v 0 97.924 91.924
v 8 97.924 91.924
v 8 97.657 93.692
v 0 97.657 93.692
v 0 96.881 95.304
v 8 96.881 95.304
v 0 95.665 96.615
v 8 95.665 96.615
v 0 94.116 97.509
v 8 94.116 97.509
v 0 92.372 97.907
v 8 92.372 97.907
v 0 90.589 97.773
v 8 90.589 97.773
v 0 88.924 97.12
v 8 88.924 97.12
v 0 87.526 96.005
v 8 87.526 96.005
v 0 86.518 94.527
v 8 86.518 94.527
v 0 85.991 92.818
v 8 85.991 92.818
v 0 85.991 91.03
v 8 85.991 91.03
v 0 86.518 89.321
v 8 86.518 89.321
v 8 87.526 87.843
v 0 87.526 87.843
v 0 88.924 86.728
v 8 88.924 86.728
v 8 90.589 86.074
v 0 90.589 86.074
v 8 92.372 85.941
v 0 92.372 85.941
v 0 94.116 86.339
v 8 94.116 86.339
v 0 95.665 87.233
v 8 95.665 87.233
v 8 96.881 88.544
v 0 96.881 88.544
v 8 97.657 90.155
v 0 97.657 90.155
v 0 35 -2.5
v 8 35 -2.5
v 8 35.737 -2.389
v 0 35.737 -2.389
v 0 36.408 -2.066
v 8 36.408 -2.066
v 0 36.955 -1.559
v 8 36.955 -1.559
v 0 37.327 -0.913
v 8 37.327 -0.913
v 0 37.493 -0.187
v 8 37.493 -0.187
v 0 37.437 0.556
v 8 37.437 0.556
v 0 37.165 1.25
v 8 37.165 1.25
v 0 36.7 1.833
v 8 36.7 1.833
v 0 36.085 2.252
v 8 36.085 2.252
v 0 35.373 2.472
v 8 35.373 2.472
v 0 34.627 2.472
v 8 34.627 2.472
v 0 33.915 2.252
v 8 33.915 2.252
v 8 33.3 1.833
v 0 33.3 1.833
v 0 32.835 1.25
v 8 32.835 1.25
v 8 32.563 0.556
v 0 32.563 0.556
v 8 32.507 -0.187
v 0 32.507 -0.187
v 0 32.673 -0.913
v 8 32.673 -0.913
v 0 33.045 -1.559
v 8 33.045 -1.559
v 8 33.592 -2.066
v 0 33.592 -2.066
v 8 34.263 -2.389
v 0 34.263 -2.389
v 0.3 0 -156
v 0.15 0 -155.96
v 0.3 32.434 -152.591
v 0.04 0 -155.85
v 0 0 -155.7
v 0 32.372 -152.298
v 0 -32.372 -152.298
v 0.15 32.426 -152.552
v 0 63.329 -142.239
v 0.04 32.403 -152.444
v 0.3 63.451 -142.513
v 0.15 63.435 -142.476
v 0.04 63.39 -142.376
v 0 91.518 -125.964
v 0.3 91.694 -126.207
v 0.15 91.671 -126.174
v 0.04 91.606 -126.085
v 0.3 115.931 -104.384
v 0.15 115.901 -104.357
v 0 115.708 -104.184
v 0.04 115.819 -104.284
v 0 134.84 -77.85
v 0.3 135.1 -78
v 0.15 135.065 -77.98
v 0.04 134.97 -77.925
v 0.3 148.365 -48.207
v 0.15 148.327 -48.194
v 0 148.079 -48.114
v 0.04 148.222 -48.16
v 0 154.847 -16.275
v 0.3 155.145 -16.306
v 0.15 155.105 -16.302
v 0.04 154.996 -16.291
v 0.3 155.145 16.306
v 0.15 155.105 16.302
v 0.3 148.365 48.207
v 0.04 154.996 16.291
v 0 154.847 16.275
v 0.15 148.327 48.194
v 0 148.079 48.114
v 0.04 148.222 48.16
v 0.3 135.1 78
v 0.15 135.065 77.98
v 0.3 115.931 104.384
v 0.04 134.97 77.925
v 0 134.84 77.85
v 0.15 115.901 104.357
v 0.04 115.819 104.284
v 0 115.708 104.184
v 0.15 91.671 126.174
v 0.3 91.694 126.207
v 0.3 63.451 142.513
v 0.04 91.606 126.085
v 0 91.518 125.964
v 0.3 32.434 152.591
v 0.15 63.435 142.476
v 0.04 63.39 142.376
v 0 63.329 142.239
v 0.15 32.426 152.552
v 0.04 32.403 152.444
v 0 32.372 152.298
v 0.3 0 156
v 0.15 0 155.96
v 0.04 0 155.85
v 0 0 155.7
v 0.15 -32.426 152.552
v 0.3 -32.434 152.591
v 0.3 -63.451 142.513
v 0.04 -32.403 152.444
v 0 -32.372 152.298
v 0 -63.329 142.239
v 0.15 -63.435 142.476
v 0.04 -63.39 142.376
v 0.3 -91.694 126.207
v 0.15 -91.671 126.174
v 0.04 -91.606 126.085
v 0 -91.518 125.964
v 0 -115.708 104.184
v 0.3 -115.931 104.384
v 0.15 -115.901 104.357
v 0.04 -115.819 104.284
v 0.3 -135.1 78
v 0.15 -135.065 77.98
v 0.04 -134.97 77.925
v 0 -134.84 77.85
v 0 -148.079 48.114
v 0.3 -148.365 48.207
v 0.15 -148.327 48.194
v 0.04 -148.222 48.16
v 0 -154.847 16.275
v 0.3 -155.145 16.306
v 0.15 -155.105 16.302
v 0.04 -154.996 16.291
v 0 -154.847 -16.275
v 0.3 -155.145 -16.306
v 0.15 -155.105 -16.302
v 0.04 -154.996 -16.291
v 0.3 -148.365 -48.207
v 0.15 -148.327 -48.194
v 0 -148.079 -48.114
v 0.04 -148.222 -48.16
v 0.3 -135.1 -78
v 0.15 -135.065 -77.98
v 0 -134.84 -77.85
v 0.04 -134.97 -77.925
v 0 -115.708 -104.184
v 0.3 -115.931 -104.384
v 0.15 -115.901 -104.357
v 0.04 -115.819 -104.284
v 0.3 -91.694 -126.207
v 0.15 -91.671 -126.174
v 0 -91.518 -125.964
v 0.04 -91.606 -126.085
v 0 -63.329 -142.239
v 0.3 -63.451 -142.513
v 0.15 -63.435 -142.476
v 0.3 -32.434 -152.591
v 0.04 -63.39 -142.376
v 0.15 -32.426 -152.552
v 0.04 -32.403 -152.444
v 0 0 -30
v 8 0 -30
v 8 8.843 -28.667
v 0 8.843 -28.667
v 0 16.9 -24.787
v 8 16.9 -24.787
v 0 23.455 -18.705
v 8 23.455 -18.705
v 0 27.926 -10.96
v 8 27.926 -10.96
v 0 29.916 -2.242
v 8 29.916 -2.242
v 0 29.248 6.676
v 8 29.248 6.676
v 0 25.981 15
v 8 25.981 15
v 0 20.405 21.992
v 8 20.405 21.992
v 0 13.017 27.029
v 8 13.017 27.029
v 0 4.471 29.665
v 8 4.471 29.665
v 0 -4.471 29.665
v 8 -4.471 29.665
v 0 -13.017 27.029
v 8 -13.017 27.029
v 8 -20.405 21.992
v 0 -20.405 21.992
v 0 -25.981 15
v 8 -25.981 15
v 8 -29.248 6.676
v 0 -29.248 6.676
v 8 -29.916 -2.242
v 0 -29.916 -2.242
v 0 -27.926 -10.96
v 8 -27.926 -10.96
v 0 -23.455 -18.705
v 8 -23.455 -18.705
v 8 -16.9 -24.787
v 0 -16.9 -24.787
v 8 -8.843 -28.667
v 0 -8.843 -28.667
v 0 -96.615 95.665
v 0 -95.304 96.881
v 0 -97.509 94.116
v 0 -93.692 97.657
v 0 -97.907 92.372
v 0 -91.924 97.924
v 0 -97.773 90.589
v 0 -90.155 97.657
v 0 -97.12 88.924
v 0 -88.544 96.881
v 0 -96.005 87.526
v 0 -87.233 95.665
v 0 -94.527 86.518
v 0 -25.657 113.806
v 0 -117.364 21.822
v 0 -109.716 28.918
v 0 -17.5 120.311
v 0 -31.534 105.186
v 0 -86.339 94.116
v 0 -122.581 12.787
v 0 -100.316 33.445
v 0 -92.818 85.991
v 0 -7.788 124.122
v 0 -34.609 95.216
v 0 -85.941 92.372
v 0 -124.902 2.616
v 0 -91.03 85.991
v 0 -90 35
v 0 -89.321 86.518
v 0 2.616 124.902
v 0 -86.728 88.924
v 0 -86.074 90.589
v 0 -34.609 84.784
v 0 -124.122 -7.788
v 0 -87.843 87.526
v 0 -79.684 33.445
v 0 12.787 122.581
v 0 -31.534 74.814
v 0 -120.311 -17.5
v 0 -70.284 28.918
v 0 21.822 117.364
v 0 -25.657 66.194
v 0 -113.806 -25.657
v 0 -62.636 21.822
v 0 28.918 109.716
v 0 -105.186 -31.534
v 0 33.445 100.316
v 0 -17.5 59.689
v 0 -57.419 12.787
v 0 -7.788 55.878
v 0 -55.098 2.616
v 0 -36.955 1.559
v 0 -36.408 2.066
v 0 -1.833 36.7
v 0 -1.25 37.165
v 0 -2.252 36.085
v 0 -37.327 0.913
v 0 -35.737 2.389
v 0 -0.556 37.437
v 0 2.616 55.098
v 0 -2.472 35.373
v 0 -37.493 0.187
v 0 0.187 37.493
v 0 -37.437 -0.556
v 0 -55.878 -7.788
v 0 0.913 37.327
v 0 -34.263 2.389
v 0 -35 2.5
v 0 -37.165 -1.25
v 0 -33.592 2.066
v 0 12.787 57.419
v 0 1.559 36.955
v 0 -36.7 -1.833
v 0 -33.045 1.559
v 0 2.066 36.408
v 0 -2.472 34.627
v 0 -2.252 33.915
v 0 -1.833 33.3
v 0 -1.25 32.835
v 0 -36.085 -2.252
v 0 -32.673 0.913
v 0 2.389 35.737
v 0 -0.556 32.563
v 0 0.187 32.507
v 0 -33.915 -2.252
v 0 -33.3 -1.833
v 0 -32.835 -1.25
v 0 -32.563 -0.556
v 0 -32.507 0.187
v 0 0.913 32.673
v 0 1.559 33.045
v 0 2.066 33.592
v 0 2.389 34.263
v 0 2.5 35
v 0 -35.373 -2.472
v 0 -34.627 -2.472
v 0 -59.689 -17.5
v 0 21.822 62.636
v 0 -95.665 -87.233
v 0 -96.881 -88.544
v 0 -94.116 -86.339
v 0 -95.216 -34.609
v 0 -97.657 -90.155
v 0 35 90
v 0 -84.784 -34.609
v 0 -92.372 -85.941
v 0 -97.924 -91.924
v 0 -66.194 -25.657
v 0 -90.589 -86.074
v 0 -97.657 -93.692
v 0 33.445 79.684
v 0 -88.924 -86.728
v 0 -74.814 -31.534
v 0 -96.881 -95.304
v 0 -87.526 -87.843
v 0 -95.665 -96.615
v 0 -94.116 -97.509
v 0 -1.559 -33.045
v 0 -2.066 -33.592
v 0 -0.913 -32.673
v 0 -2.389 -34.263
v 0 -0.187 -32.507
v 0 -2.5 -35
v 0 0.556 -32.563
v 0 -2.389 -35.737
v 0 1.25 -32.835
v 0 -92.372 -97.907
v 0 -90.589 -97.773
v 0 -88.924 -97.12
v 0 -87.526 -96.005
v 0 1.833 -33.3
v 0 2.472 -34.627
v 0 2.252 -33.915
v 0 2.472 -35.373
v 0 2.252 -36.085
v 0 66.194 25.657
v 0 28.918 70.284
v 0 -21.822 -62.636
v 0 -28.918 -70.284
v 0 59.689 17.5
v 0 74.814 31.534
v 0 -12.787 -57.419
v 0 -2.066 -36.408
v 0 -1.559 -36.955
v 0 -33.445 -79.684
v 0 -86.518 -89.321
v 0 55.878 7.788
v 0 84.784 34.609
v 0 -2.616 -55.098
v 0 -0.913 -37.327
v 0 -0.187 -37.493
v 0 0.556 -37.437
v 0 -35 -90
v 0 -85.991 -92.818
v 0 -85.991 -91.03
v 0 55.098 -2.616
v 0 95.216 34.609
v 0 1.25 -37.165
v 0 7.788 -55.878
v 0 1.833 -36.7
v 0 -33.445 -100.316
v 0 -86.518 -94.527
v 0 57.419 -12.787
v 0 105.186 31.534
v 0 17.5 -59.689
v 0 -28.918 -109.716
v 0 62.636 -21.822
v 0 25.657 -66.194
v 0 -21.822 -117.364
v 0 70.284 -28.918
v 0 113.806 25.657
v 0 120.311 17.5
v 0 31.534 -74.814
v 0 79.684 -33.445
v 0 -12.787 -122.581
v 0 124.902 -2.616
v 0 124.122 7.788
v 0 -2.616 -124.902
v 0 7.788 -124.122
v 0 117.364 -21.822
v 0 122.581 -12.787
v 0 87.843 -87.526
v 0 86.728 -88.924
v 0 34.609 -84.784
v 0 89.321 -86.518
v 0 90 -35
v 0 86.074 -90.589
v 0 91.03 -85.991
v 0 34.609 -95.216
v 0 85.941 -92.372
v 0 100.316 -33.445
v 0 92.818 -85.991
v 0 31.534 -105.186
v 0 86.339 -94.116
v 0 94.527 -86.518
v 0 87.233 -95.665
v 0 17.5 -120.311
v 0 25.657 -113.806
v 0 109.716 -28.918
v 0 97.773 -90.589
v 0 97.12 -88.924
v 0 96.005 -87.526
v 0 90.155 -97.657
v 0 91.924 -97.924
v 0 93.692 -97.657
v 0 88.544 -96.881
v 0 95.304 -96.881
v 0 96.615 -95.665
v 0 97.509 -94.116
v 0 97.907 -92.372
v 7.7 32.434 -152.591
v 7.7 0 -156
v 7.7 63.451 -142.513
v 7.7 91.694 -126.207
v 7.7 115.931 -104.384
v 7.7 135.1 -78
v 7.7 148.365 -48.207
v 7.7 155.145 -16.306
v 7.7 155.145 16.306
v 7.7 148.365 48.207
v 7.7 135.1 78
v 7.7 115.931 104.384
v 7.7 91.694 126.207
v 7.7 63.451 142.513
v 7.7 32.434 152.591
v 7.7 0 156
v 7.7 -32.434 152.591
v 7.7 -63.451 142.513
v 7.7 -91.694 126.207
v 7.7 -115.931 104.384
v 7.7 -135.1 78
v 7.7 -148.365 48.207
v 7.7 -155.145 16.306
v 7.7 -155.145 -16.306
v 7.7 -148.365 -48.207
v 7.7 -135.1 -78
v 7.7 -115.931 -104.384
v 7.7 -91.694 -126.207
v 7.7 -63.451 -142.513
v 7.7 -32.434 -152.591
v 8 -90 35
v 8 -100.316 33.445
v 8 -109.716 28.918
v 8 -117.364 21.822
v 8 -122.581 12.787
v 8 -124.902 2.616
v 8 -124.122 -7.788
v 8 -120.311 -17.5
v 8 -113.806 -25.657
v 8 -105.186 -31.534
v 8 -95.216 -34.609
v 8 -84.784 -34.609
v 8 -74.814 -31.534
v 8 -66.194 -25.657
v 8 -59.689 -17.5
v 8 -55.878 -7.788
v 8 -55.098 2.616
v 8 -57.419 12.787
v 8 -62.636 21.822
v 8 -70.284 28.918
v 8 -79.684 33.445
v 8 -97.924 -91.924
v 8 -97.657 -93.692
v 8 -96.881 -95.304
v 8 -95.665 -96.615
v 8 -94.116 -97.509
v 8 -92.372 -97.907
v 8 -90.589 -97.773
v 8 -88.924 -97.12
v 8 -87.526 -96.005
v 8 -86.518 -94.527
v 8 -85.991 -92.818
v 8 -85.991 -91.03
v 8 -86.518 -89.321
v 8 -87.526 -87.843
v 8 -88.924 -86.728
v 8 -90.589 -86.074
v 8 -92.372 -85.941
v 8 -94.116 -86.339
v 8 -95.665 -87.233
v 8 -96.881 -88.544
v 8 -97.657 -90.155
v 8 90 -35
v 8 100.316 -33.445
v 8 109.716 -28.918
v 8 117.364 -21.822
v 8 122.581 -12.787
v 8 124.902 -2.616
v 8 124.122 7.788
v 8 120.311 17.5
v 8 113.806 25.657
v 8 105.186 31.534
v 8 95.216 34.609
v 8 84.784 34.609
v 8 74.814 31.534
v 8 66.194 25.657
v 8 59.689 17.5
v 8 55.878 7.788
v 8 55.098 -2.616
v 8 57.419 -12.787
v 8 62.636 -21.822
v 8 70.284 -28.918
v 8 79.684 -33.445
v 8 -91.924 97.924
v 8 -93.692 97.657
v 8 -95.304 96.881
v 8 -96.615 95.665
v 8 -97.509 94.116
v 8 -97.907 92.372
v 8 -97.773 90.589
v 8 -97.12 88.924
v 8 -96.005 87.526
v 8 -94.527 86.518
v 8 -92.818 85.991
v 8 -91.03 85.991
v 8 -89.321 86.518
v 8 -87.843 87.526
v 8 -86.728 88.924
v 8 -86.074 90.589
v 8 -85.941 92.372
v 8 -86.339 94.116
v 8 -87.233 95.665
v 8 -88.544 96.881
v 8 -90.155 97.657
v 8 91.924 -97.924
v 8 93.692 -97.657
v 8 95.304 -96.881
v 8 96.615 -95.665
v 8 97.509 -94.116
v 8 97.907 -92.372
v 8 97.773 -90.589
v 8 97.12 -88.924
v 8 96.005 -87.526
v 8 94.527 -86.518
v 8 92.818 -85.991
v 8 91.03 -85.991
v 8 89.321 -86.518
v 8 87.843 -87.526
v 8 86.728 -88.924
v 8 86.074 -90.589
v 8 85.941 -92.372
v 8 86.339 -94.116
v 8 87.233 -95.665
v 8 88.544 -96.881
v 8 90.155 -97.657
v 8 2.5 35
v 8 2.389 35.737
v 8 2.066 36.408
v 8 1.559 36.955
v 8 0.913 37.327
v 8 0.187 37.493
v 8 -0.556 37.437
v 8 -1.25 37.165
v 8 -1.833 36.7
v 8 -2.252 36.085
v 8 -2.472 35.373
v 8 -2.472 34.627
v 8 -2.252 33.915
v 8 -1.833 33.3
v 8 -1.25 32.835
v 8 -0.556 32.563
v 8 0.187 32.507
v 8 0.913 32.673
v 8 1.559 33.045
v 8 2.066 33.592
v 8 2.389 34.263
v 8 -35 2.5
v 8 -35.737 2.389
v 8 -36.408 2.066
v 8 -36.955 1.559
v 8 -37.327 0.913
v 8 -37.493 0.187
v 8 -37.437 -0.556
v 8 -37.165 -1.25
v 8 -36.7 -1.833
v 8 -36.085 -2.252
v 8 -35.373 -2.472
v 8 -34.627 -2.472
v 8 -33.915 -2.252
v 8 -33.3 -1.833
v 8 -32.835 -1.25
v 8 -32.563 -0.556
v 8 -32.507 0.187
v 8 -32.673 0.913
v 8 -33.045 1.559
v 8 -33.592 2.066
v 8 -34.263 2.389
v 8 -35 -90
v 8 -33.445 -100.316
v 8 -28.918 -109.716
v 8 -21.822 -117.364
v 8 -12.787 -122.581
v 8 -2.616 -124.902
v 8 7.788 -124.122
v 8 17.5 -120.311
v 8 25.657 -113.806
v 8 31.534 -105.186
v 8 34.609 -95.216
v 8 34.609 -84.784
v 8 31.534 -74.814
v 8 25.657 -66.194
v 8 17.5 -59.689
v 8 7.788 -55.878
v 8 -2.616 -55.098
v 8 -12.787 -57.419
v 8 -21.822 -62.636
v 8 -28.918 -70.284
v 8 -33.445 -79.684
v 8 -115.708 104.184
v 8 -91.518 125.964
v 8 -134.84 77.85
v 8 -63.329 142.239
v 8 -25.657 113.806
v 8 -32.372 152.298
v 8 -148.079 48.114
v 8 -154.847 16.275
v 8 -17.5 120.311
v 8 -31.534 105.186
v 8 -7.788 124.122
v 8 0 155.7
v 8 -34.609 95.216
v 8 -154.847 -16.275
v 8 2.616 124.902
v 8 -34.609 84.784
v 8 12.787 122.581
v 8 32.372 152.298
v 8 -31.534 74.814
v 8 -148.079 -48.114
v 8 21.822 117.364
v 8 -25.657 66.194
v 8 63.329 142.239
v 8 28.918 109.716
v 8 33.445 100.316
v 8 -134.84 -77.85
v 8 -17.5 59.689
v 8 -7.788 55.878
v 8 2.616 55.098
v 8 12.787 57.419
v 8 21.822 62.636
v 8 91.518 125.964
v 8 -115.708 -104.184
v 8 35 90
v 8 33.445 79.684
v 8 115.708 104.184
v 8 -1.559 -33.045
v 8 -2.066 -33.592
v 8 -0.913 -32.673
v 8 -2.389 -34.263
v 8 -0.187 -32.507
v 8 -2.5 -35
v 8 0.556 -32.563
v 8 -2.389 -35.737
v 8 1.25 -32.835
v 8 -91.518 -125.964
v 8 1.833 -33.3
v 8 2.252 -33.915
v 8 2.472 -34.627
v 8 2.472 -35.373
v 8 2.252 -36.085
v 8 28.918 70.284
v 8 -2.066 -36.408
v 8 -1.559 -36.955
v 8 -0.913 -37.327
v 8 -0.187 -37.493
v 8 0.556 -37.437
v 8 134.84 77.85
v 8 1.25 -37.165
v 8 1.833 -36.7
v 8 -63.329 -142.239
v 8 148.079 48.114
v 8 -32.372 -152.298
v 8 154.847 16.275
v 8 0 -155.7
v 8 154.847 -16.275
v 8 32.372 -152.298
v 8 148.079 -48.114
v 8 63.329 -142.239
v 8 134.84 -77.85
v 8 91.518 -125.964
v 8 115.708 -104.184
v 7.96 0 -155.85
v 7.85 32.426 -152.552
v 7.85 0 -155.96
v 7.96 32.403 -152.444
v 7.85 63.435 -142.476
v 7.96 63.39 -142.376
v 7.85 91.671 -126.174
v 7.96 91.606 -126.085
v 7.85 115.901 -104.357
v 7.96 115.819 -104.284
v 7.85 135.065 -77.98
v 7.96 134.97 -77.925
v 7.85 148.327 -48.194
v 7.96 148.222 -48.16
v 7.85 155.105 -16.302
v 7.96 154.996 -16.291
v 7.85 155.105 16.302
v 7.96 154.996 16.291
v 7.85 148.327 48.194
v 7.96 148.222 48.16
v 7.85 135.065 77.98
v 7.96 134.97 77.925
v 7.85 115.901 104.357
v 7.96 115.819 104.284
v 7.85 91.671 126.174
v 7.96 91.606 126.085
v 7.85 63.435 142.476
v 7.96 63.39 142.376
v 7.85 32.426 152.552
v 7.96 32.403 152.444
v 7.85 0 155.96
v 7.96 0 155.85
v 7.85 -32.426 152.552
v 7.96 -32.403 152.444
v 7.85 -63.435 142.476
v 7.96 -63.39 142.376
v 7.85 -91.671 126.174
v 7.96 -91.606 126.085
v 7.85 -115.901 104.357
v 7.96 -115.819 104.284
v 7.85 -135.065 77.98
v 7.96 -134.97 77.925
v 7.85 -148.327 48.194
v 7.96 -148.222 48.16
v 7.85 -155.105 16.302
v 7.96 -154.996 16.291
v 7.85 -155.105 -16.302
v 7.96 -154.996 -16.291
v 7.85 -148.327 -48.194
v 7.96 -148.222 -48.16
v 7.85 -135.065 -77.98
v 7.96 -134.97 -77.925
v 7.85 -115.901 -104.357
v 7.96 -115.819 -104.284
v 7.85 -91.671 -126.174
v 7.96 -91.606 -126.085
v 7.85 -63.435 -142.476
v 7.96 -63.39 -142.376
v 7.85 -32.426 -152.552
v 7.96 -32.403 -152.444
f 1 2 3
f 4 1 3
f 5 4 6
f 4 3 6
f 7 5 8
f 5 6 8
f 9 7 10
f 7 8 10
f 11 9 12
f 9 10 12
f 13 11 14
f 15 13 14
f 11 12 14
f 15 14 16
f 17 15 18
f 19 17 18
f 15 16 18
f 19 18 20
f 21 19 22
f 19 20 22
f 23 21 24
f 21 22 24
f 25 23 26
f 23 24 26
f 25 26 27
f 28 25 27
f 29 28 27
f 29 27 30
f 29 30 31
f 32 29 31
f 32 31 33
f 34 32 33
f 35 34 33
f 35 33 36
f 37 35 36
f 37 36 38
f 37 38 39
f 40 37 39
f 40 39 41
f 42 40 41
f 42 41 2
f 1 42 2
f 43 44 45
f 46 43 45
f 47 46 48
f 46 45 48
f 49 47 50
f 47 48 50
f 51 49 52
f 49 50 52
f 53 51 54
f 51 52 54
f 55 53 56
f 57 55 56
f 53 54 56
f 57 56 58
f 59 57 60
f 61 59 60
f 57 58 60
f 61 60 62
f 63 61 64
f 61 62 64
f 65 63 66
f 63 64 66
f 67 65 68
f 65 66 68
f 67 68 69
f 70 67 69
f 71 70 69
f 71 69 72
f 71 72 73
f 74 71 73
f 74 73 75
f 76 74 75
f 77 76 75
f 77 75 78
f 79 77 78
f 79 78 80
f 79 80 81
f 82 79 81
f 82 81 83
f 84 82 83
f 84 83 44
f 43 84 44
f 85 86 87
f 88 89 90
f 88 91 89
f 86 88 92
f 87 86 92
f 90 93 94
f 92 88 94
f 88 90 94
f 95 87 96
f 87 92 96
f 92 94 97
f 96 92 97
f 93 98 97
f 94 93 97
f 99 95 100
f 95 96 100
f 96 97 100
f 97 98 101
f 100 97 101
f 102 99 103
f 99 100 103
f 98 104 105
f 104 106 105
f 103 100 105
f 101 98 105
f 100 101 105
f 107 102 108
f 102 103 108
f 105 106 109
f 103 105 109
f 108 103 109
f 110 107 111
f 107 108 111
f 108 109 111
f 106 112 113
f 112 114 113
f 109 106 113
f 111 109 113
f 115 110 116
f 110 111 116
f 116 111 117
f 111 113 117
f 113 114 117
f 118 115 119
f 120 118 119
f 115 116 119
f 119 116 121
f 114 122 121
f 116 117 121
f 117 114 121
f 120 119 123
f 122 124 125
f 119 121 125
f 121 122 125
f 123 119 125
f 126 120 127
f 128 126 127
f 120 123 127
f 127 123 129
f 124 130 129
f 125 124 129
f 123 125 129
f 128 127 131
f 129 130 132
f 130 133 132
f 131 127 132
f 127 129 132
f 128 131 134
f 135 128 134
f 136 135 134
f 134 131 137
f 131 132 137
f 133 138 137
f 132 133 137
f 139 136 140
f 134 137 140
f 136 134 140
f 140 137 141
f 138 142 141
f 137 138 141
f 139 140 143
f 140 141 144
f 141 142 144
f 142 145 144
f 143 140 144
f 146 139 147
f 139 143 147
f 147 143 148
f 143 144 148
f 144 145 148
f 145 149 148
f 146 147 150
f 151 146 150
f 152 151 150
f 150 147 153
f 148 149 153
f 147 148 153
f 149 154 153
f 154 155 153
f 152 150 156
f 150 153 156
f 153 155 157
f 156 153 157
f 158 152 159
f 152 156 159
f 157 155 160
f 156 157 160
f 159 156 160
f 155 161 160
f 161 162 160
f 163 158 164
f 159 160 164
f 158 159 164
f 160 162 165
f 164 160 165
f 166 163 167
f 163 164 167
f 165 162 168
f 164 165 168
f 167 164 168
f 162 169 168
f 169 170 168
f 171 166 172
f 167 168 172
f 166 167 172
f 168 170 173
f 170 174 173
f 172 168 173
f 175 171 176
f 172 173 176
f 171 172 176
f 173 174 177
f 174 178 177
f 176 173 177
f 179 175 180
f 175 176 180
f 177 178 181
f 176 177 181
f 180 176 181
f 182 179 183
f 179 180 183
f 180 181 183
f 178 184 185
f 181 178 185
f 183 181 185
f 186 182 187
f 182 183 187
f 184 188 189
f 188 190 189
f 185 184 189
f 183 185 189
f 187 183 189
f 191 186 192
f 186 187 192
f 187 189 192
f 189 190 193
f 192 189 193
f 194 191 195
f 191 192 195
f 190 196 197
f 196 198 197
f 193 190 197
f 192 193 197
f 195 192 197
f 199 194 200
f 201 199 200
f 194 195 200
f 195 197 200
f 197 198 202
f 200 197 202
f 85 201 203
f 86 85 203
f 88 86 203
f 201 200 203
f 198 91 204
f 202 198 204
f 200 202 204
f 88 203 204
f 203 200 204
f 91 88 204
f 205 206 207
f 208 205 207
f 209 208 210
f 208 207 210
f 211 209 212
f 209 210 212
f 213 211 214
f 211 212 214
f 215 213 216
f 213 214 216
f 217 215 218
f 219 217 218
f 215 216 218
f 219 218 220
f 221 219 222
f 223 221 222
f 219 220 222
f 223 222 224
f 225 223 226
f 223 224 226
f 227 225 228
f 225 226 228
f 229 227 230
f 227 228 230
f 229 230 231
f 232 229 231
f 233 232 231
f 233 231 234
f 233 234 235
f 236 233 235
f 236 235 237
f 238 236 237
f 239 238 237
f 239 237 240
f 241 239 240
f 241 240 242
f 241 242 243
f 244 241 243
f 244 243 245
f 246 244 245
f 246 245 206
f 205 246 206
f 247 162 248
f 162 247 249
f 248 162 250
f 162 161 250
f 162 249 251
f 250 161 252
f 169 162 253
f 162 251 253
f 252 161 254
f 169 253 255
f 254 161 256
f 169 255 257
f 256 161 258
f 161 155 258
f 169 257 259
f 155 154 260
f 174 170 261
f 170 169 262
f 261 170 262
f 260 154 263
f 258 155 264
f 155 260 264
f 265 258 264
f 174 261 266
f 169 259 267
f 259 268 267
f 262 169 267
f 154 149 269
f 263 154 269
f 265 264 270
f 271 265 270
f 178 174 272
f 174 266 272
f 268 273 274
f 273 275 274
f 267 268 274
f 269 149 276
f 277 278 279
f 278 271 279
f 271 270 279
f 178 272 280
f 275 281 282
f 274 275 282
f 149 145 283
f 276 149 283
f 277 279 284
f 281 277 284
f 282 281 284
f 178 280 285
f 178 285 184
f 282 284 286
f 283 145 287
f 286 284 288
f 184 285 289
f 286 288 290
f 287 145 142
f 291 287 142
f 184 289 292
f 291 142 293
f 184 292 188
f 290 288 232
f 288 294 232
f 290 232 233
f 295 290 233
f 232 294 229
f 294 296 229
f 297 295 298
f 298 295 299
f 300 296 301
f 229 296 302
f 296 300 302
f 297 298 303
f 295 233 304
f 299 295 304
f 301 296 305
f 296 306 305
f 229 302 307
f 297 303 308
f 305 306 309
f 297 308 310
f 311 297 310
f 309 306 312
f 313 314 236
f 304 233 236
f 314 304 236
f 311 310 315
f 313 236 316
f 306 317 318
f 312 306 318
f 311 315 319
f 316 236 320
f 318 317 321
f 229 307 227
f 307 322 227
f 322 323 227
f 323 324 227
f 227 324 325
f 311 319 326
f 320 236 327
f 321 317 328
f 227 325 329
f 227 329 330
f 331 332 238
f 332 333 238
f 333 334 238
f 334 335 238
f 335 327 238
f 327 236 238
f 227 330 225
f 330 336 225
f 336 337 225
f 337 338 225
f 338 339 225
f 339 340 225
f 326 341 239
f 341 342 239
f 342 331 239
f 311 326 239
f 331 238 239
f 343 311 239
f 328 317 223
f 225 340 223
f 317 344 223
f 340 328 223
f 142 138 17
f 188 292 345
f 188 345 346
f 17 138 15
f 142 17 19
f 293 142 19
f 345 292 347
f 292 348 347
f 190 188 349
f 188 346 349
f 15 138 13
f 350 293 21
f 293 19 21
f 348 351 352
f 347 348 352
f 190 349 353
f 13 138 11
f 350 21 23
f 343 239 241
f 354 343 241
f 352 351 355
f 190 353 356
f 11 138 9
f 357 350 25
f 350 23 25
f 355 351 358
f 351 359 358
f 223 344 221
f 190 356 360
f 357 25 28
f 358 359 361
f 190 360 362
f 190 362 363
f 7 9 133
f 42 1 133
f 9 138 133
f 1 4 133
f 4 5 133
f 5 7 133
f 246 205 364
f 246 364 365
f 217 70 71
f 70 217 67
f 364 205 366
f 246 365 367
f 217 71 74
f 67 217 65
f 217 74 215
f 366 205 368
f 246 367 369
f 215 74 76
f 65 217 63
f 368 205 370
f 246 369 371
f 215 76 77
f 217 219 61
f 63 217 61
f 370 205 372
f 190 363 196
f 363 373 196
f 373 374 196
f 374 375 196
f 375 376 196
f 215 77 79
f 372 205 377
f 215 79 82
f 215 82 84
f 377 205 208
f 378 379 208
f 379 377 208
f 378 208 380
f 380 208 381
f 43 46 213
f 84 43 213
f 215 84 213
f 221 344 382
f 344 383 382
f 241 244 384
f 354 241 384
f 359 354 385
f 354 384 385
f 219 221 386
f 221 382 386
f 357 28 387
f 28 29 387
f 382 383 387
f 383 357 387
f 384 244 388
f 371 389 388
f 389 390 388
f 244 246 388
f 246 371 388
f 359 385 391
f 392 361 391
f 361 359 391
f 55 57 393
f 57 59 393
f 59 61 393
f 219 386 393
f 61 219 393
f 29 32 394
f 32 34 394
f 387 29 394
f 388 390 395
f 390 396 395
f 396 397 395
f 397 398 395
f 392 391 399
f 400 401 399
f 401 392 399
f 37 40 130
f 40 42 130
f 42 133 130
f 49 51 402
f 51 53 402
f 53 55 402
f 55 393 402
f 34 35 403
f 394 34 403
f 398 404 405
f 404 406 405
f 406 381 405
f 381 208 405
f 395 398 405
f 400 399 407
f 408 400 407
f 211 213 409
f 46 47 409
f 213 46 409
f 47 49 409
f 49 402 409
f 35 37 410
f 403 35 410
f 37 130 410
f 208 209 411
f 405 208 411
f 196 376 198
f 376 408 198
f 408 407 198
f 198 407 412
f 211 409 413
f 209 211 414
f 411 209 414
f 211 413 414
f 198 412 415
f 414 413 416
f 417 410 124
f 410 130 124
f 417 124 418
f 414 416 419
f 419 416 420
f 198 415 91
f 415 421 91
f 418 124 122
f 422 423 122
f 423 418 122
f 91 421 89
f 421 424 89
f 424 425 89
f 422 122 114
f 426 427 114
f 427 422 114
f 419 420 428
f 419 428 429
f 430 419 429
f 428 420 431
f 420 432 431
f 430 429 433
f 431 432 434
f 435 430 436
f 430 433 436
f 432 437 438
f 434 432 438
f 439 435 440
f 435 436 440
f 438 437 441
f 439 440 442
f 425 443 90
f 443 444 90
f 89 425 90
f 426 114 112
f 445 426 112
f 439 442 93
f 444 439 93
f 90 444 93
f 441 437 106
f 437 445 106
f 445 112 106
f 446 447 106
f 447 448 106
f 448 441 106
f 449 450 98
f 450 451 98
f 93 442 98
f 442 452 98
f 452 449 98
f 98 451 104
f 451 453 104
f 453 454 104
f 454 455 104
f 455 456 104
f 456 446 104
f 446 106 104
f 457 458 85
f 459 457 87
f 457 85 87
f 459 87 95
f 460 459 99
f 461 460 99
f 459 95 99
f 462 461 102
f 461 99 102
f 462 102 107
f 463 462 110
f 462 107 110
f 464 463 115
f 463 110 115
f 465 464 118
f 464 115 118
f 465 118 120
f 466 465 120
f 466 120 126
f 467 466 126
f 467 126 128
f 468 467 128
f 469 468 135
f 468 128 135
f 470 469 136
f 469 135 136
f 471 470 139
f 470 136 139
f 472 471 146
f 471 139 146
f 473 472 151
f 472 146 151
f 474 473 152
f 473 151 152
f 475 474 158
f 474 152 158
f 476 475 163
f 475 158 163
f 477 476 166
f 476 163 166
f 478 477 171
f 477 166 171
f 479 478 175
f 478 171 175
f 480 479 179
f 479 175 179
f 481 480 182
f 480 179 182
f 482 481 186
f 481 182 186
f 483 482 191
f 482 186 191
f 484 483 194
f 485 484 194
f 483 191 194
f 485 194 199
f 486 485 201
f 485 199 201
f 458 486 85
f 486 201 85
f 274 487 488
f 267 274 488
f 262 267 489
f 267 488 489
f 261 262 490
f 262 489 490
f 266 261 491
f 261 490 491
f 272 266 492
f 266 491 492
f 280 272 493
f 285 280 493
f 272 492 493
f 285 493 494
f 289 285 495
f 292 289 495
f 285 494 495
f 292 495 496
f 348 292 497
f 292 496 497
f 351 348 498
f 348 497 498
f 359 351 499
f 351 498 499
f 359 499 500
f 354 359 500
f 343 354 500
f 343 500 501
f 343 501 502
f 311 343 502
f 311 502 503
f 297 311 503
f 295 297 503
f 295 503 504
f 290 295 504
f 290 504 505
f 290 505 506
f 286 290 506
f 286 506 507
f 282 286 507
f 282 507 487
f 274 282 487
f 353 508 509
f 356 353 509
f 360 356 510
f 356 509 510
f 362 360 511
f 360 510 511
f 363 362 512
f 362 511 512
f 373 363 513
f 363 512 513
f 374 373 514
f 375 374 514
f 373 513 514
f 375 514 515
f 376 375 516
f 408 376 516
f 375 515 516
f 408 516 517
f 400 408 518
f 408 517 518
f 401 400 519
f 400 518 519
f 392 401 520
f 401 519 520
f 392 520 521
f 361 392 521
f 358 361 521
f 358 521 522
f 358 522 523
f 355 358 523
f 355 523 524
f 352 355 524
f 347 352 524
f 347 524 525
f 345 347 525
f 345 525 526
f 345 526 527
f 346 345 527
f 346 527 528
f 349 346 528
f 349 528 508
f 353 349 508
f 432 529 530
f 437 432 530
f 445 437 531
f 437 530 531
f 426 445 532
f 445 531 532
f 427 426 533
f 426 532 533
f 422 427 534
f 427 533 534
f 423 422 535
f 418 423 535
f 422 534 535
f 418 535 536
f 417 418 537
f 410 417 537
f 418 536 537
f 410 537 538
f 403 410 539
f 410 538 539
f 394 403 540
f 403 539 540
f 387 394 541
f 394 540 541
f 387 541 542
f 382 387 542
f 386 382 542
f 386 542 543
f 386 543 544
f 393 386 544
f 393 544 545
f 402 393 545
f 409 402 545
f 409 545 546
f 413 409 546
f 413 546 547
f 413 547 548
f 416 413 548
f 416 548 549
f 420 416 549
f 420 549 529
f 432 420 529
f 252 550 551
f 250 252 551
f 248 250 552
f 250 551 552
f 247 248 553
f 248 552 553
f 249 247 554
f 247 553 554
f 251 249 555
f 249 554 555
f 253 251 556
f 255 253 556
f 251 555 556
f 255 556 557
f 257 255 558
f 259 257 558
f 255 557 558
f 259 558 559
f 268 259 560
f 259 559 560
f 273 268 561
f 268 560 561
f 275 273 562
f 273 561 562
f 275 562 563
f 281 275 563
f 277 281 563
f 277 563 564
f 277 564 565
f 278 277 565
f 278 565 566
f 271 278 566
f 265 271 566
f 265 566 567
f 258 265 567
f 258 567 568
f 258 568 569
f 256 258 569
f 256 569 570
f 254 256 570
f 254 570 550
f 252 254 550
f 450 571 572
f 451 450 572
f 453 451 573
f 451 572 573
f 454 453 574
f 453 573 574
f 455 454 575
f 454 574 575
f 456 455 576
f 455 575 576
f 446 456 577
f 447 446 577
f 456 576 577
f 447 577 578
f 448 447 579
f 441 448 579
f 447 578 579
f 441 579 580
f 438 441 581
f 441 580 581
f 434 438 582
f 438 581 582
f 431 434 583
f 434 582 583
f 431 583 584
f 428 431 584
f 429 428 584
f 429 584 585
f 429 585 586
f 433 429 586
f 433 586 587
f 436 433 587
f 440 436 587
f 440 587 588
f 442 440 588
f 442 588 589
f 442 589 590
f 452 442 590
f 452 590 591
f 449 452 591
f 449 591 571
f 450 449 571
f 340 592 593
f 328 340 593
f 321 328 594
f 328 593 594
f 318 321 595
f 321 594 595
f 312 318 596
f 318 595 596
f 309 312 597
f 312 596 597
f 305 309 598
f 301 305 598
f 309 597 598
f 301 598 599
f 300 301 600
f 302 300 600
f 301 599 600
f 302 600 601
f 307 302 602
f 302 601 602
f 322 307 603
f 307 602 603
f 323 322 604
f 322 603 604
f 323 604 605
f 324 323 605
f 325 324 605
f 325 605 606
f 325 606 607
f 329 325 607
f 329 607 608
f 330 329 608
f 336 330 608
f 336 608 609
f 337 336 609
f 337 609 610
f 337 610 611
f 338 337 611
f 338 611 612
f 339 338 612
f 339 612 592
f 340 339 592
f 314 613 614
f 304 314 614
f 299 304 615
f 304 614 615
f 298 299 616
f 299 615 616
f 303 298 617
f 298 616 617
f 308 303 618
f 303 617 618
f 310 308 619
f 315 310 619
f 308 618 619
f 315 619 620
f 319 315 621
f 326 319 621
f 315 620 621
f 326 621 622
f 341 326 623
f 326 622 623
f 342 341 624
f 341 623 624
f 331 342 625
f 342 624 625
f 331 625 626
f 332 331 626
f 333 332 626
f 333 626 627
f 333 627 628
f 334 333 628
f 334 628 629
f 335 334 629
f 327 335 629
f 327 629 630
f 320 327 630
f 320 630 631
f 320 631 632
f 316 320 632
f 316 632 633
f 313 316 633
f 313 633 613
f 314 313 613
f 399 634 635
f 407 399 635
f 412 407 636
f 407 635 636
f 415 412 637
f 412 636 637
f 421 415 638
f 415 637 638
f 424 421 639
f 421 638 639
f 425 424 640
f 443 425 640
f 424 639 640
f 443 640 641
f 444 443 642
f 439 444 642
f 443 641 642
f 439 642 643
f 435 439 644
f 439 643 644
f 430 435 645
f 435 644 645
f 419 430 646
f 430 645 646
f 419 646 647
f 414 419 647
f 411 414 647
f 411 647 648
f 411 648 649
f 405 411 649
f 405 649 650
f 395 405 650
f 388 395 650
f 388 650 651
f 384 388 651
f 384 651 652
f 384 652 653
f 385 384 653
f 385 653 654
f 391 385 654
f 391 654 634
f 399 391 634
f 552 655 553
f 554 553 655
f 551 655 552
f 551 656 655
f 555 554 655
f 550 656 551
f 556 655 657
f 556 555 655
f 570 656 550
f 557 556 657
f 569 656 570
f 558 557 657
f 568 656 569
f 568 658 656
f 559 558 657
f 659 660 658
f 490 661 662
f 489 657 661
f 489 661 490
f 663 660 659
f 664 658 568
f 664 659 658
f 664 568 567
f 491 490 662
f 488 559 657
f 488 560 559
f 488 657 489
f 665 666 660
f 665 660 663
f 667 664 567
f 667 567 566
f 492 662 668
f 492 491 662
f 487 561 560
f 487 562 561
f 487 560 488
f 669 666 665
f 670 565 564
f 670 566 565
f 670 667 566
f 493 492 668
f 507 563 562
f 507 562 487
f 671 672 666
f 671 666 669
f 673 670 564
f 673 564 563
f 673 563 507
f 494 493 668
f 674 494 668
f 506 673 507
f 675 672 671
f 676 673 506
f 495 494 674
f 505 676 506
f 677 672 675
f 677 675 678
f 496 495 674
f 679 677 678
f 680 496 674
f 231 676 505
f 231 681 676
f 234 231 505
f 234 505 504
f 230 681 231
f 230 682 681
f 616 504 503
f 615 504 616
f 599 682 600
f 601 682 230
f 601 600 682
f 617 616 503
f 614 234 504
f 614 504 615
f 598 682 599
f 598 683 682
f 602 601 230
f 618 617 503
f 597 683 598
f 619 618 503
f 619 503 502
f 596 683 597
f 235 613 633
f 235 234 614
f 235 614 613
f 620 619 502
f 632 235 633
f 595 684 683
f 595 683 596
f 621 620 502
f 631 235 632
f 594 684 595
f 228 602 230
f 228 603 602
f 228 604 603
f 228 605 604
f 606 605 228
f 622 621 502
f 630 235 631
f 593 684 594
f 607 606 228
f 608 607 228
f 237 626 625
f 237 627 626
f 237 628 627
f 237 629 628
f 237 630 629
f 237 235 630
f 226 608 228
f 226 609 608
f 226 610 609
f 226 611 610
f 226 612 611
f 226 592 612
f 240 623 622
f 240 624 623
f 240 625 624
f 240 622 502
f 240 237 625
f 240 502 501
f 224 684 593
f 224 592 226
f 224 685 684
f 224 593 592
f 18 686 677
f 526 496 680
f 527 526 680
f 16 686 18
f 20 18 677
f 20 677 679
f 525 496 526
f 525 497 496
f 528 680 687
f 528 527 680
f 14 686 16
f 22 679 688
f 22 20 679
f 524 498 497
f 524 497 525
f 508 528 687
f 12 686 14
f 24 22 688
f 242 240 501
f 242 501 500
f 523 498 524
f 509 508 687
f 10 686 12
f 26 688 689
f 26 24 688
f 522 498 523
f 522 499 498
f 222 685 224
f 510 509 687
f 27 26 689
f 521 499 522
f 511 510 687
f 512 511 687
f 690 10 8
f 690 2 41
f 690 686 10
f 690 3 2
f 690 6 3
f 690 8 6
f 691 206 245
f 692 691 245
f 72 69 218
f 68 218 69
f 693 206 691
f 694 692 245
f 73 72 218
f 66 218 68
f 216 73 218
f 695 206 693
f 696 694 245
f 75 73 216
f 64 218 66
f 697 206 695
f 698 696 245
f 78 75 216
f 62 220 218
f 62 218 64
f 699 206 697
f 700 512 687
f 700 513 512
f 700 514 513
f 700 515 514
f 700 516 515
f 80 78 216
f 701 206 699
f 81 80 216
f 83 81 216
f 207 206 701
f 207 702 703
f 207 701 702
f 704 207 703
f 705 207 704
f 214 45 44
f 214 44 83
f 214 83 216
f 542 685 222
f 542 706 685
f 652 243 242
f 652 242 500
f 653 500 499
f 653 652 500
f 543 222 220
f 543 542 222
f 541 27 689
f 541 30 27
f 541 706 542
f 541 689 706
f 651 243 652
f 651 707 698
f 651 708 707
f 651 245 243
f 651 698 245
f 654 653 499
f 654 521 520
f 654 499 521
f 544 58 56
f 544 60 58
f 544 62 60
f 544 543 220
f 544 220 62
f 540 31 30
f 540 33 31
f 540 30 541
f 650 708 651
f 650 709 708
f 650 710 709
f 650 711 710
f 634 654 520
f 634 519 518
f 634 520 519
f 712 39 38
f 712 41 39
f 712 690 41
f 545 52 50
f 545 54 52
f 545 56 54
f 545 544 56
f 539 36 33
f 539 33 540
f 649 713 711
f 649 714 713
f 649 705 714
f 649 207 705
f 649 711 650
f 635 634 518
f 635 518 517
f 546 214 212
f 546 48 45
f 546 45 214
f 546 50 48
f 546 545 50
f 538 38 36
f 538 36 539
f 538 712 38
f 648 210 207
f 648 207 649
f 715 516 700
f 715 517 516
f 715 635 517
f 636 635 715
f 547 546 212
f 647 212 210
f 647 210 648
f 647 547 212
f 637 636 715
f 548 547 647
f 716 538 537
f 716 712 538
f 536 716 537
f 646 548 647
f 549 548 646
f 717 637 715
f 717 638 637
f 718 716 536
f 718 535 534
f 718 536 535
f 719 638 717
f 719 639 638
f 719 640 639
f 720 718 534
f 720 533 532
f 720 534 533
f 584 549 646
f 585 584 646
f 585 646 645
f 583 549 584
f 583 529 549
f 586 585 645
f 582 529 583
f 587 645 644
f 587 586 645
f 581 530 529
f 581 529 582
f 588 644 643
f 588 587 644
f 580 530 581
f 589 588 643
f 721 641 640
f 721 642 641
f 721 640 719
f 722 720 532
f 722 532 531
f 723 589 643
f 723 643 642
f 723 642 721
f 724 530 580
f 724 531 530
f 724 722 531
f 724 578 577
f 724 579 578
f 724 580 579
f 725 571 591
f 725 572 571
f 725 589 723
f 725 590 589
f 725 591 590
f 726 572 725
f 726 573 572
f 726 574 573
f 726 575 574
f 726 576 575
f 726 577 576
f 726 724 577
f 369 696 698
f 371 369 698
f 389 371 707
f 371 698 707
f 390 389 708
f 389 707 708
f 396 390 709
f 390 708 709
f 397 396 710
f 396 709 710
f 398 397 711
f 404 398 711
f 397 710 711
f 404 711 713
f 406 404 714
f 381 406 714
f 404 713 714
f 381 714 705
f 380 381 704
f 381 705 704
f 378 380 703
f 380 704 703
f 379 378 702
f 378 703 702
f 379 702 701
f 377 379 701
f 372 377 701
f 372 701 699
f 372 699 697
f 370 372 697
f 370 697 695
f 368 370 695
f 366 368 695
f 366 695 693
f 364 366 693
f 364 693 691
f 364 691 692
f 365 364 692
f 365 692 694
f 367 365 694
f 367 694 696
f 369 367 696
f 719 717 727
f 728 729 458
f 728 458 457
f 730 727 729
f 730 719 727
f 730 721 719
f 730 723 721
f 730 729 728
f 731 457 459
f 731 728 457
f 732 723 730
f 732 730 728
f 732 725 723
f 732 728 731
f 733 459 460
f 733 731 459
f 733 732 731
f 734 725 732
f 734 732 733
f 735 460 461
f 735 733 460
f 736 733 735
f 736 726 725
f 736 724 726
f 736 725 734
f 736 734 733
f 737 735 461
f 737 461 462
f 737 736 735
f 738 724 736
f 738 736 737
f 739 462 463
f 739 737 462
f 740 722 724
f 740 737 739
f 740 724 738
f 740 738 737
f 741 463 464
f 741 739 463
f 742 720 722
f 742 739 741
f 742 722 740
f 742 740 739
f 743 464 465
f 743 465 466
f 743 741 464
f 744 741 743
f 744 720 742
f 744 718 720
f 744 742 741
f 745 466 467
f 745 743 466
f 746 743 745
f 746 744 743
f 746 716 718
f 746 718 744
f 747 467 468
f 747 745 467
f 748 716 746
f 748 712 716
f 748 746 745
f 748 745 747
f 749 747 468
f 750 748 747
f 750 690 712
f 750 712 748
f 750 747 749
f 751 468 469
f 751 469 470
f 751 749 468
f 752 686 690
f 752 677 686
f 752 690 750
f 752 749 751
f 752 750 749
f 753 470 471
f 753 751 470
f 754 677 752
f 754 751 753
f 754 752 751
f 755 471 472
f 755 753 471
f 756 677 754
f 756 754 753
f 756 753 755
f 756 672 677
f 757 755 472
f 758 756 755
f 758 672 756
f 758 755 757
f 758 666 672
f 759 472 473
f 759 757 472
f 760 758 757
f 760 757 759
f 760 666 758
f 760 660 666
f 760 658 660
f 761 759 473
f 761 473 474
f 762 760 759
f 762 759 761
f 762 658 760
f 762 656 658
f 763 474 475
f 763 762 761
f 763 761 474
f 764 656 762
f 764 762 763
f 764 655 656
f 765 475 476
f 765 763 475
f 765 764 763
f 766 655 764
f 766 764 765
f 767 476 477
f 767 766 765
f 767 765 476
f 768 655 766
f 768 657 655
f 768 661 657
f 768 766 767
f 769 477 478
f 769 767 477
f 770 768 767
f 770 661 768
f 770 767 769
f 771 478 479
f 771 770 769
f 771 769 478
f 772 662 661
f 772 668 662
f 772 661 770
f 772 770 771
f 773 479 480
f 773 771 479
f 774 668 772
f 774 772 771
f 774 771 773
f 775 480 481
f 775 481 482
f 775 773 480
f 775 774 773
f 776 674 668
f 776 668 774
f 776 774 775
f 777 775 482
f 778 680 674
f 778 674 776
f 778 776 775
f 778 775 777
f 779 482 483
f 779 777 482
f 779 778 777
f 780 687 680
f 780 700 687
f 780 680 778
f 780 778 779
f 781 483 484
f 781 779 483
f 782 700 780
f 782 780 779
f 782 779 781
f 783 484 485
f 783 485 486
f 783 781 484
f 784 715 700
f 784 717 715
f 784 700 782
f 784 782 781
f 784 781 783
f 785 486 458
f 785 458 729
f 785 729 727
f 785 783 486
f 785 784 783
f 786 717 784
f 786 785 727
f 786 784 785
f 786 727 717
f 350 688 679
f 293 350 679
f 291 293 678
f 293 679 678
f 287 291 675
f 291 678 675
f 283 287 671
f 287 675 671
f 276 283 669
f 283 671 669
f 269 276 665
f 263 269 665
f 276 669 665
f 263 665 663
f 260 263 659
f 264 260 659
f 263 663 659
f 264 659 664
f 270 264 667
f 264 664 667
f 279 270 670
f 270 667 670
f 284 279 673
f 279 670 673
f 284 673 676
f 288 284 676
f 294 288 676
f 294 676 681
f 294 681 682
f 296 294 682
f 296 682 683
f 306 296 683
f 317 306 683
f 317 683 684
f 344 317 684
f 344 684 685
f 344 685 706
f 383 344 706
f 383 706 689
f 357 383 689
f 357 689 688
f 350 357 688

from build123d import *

# Parameters (mm, degrees)
SKETCH_1_R               = 156
EXTRUDE_1_DEPTH          = 8
SKETCH_2_R               = 30
CUT_EXTRUDE_1_DEPTH      = 10
SKETCH_3_R               = 35
CUT_EXTRUDE_2_DEPTH      = 10
PATTERN_CIRCULAR_1_COUNT = 4
SKETCH_4_R               = 6
CUT_EXTRUDE_3_DEPTH      = 10
PATTERN_CIRCULAR_2_COUNT = 4
SKETCH_6_R               = 2.5
CUT_EXTRUDE_5_DEPTH      = 10
PATTERN_CIRCULAR_4_COUNT = 4
FILLET_1_R               = 0.3


with BuildPart() as part:
    # 草图1 → 凸台-拉伸1 (new body)
    with BuildSketch(Plane(origin=(0, 0, 0), x_dir=(0, 0, -1), z_dir=(1, 0, 0))):
        Circle(SKETCH_1_R)
    extrude(amount=EXTRUDE_1_DEPTH)

    # 草图2 → 切除-拉伸1 (cut)
    with BuildSketch(Plane(origin=(8, 0, 0), x_dir=(0, 0, -1), z_dir=(1, 0, 0))):
        Circle(SKETCH_2_R)
    extrude(amount=-CUT_EXTRUDE_1_DEPTH, mode=Mode.SUBTRACT)

    # 草图3 → 切除-拉伸2 (cut)
    with BuildSketch(Plane(origin=(8, 0, 0), x_dir=(0, 0, -1), z_dir=(1, 0, 0))):
        with Locations((0, 90)):
            Circle(SKETCH_3_R)
    cut_extrude_2 = extrude(amount=-CUT_EXTRUDE_2_DEPTH, mode=Mode.SUBTRACT)

    # 阵列(圆周)1: 切除-拉伸2 ×4 about axis
    pattern_circular_1_axis = Axis((0, 0, 0), (1, 0, 0))
    for i in range(1, PATTERN_CIRCULAR_1_COUNT):
        add(cut_extrude_2.rotate(pattern_circular_1_axis, i * 360 / PATTERN_CIRCULAR_1_COUNT), mode=Mode.SUBTRACT)

    # 草图4 → 切除-拉伸3 (cut)
    with BuildSketch(Plane(origin=(8, 0, 0), x_dir=(0, 0, -1), z_dir=(1, 0, 0))):
        with Locations((91.923881554, 91.923881554)):
            Circle(SKETCH_4_R)
    cut_extrude_3 = extrude(amount=-CUT_EXTRUDE_3_DEPTH, mode=Mode.SUBTRACT)

    # 阵列(圆周)2: 切除-拉伸3 ×4 about axis
    pattern_circular_2_axis = Axis((0, 0, 0), (1, 0, 0))
    for i in range(1, PATTERN_CIRCULAR_2_COUNT):
        add(cut_extrude_3.rotate(pattern_circular_2_axis, i * 360 / PATTERN_CIRCULAR_2_COUNT), mode=Mode.SUBTRACT)

    # 草图6 → 切除-拉伸5 (cut)
    with BuildSketch(Plane(origin=(8, 0, 0), x_dir=(0, 0, -1), z_dir=(1, 0, 0))):
        with Locations((0, 35)):
            Circle(SKETCH_6_R)
    cut_extrude_5 = extrude(amount=-CUT_EXTRUDE_5_DEPTH, mode=Mode.SUBTRACT)

    # 阵列(圆周)4: 切除-拉伸5 ×4 about axis
    pattern_circular_4_axis = Axis((0, 0, 0), (1, 0, 0))
    for i in range(1, PATTERN_CIRCULAR_4_COUNT):
        add(cut_extrude_5.rotate(pattern_circular_4_axis, i * 360 / PATTERN_CIRCULAR_4_COUNT), mode=Mode.SUBTRACT)

    # 圆角1
    fillet_1_edges = [part.edges().sort_by_distance(p)[0] for p in [
        (0, 0, 156),
        (8, 0, 156),
    ]]
    fillet(fillet_1_edges, radius=FILLET_1_R)


solid = part.part
